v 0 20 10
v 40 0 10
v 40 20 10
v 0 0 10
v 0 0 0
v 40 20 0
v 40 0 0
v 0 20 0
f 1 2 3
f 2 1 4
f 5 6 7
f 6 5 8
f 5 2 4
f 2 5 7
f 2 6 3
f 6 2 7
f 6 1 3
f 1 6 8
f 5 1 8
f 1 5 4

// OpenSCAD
// The correct version of dimensions_bbox_fail: the declared width parameter
// is the one actually used to build the geometry, so the rendered bbox
// matches "// EXPECTED_BBOX:".

$fa = 2; $fs = 0.3;

// EXPECTED_BBOX: [40, 20, 10]

declared_width = 40;

cube([declared_width, 20, 10]);
